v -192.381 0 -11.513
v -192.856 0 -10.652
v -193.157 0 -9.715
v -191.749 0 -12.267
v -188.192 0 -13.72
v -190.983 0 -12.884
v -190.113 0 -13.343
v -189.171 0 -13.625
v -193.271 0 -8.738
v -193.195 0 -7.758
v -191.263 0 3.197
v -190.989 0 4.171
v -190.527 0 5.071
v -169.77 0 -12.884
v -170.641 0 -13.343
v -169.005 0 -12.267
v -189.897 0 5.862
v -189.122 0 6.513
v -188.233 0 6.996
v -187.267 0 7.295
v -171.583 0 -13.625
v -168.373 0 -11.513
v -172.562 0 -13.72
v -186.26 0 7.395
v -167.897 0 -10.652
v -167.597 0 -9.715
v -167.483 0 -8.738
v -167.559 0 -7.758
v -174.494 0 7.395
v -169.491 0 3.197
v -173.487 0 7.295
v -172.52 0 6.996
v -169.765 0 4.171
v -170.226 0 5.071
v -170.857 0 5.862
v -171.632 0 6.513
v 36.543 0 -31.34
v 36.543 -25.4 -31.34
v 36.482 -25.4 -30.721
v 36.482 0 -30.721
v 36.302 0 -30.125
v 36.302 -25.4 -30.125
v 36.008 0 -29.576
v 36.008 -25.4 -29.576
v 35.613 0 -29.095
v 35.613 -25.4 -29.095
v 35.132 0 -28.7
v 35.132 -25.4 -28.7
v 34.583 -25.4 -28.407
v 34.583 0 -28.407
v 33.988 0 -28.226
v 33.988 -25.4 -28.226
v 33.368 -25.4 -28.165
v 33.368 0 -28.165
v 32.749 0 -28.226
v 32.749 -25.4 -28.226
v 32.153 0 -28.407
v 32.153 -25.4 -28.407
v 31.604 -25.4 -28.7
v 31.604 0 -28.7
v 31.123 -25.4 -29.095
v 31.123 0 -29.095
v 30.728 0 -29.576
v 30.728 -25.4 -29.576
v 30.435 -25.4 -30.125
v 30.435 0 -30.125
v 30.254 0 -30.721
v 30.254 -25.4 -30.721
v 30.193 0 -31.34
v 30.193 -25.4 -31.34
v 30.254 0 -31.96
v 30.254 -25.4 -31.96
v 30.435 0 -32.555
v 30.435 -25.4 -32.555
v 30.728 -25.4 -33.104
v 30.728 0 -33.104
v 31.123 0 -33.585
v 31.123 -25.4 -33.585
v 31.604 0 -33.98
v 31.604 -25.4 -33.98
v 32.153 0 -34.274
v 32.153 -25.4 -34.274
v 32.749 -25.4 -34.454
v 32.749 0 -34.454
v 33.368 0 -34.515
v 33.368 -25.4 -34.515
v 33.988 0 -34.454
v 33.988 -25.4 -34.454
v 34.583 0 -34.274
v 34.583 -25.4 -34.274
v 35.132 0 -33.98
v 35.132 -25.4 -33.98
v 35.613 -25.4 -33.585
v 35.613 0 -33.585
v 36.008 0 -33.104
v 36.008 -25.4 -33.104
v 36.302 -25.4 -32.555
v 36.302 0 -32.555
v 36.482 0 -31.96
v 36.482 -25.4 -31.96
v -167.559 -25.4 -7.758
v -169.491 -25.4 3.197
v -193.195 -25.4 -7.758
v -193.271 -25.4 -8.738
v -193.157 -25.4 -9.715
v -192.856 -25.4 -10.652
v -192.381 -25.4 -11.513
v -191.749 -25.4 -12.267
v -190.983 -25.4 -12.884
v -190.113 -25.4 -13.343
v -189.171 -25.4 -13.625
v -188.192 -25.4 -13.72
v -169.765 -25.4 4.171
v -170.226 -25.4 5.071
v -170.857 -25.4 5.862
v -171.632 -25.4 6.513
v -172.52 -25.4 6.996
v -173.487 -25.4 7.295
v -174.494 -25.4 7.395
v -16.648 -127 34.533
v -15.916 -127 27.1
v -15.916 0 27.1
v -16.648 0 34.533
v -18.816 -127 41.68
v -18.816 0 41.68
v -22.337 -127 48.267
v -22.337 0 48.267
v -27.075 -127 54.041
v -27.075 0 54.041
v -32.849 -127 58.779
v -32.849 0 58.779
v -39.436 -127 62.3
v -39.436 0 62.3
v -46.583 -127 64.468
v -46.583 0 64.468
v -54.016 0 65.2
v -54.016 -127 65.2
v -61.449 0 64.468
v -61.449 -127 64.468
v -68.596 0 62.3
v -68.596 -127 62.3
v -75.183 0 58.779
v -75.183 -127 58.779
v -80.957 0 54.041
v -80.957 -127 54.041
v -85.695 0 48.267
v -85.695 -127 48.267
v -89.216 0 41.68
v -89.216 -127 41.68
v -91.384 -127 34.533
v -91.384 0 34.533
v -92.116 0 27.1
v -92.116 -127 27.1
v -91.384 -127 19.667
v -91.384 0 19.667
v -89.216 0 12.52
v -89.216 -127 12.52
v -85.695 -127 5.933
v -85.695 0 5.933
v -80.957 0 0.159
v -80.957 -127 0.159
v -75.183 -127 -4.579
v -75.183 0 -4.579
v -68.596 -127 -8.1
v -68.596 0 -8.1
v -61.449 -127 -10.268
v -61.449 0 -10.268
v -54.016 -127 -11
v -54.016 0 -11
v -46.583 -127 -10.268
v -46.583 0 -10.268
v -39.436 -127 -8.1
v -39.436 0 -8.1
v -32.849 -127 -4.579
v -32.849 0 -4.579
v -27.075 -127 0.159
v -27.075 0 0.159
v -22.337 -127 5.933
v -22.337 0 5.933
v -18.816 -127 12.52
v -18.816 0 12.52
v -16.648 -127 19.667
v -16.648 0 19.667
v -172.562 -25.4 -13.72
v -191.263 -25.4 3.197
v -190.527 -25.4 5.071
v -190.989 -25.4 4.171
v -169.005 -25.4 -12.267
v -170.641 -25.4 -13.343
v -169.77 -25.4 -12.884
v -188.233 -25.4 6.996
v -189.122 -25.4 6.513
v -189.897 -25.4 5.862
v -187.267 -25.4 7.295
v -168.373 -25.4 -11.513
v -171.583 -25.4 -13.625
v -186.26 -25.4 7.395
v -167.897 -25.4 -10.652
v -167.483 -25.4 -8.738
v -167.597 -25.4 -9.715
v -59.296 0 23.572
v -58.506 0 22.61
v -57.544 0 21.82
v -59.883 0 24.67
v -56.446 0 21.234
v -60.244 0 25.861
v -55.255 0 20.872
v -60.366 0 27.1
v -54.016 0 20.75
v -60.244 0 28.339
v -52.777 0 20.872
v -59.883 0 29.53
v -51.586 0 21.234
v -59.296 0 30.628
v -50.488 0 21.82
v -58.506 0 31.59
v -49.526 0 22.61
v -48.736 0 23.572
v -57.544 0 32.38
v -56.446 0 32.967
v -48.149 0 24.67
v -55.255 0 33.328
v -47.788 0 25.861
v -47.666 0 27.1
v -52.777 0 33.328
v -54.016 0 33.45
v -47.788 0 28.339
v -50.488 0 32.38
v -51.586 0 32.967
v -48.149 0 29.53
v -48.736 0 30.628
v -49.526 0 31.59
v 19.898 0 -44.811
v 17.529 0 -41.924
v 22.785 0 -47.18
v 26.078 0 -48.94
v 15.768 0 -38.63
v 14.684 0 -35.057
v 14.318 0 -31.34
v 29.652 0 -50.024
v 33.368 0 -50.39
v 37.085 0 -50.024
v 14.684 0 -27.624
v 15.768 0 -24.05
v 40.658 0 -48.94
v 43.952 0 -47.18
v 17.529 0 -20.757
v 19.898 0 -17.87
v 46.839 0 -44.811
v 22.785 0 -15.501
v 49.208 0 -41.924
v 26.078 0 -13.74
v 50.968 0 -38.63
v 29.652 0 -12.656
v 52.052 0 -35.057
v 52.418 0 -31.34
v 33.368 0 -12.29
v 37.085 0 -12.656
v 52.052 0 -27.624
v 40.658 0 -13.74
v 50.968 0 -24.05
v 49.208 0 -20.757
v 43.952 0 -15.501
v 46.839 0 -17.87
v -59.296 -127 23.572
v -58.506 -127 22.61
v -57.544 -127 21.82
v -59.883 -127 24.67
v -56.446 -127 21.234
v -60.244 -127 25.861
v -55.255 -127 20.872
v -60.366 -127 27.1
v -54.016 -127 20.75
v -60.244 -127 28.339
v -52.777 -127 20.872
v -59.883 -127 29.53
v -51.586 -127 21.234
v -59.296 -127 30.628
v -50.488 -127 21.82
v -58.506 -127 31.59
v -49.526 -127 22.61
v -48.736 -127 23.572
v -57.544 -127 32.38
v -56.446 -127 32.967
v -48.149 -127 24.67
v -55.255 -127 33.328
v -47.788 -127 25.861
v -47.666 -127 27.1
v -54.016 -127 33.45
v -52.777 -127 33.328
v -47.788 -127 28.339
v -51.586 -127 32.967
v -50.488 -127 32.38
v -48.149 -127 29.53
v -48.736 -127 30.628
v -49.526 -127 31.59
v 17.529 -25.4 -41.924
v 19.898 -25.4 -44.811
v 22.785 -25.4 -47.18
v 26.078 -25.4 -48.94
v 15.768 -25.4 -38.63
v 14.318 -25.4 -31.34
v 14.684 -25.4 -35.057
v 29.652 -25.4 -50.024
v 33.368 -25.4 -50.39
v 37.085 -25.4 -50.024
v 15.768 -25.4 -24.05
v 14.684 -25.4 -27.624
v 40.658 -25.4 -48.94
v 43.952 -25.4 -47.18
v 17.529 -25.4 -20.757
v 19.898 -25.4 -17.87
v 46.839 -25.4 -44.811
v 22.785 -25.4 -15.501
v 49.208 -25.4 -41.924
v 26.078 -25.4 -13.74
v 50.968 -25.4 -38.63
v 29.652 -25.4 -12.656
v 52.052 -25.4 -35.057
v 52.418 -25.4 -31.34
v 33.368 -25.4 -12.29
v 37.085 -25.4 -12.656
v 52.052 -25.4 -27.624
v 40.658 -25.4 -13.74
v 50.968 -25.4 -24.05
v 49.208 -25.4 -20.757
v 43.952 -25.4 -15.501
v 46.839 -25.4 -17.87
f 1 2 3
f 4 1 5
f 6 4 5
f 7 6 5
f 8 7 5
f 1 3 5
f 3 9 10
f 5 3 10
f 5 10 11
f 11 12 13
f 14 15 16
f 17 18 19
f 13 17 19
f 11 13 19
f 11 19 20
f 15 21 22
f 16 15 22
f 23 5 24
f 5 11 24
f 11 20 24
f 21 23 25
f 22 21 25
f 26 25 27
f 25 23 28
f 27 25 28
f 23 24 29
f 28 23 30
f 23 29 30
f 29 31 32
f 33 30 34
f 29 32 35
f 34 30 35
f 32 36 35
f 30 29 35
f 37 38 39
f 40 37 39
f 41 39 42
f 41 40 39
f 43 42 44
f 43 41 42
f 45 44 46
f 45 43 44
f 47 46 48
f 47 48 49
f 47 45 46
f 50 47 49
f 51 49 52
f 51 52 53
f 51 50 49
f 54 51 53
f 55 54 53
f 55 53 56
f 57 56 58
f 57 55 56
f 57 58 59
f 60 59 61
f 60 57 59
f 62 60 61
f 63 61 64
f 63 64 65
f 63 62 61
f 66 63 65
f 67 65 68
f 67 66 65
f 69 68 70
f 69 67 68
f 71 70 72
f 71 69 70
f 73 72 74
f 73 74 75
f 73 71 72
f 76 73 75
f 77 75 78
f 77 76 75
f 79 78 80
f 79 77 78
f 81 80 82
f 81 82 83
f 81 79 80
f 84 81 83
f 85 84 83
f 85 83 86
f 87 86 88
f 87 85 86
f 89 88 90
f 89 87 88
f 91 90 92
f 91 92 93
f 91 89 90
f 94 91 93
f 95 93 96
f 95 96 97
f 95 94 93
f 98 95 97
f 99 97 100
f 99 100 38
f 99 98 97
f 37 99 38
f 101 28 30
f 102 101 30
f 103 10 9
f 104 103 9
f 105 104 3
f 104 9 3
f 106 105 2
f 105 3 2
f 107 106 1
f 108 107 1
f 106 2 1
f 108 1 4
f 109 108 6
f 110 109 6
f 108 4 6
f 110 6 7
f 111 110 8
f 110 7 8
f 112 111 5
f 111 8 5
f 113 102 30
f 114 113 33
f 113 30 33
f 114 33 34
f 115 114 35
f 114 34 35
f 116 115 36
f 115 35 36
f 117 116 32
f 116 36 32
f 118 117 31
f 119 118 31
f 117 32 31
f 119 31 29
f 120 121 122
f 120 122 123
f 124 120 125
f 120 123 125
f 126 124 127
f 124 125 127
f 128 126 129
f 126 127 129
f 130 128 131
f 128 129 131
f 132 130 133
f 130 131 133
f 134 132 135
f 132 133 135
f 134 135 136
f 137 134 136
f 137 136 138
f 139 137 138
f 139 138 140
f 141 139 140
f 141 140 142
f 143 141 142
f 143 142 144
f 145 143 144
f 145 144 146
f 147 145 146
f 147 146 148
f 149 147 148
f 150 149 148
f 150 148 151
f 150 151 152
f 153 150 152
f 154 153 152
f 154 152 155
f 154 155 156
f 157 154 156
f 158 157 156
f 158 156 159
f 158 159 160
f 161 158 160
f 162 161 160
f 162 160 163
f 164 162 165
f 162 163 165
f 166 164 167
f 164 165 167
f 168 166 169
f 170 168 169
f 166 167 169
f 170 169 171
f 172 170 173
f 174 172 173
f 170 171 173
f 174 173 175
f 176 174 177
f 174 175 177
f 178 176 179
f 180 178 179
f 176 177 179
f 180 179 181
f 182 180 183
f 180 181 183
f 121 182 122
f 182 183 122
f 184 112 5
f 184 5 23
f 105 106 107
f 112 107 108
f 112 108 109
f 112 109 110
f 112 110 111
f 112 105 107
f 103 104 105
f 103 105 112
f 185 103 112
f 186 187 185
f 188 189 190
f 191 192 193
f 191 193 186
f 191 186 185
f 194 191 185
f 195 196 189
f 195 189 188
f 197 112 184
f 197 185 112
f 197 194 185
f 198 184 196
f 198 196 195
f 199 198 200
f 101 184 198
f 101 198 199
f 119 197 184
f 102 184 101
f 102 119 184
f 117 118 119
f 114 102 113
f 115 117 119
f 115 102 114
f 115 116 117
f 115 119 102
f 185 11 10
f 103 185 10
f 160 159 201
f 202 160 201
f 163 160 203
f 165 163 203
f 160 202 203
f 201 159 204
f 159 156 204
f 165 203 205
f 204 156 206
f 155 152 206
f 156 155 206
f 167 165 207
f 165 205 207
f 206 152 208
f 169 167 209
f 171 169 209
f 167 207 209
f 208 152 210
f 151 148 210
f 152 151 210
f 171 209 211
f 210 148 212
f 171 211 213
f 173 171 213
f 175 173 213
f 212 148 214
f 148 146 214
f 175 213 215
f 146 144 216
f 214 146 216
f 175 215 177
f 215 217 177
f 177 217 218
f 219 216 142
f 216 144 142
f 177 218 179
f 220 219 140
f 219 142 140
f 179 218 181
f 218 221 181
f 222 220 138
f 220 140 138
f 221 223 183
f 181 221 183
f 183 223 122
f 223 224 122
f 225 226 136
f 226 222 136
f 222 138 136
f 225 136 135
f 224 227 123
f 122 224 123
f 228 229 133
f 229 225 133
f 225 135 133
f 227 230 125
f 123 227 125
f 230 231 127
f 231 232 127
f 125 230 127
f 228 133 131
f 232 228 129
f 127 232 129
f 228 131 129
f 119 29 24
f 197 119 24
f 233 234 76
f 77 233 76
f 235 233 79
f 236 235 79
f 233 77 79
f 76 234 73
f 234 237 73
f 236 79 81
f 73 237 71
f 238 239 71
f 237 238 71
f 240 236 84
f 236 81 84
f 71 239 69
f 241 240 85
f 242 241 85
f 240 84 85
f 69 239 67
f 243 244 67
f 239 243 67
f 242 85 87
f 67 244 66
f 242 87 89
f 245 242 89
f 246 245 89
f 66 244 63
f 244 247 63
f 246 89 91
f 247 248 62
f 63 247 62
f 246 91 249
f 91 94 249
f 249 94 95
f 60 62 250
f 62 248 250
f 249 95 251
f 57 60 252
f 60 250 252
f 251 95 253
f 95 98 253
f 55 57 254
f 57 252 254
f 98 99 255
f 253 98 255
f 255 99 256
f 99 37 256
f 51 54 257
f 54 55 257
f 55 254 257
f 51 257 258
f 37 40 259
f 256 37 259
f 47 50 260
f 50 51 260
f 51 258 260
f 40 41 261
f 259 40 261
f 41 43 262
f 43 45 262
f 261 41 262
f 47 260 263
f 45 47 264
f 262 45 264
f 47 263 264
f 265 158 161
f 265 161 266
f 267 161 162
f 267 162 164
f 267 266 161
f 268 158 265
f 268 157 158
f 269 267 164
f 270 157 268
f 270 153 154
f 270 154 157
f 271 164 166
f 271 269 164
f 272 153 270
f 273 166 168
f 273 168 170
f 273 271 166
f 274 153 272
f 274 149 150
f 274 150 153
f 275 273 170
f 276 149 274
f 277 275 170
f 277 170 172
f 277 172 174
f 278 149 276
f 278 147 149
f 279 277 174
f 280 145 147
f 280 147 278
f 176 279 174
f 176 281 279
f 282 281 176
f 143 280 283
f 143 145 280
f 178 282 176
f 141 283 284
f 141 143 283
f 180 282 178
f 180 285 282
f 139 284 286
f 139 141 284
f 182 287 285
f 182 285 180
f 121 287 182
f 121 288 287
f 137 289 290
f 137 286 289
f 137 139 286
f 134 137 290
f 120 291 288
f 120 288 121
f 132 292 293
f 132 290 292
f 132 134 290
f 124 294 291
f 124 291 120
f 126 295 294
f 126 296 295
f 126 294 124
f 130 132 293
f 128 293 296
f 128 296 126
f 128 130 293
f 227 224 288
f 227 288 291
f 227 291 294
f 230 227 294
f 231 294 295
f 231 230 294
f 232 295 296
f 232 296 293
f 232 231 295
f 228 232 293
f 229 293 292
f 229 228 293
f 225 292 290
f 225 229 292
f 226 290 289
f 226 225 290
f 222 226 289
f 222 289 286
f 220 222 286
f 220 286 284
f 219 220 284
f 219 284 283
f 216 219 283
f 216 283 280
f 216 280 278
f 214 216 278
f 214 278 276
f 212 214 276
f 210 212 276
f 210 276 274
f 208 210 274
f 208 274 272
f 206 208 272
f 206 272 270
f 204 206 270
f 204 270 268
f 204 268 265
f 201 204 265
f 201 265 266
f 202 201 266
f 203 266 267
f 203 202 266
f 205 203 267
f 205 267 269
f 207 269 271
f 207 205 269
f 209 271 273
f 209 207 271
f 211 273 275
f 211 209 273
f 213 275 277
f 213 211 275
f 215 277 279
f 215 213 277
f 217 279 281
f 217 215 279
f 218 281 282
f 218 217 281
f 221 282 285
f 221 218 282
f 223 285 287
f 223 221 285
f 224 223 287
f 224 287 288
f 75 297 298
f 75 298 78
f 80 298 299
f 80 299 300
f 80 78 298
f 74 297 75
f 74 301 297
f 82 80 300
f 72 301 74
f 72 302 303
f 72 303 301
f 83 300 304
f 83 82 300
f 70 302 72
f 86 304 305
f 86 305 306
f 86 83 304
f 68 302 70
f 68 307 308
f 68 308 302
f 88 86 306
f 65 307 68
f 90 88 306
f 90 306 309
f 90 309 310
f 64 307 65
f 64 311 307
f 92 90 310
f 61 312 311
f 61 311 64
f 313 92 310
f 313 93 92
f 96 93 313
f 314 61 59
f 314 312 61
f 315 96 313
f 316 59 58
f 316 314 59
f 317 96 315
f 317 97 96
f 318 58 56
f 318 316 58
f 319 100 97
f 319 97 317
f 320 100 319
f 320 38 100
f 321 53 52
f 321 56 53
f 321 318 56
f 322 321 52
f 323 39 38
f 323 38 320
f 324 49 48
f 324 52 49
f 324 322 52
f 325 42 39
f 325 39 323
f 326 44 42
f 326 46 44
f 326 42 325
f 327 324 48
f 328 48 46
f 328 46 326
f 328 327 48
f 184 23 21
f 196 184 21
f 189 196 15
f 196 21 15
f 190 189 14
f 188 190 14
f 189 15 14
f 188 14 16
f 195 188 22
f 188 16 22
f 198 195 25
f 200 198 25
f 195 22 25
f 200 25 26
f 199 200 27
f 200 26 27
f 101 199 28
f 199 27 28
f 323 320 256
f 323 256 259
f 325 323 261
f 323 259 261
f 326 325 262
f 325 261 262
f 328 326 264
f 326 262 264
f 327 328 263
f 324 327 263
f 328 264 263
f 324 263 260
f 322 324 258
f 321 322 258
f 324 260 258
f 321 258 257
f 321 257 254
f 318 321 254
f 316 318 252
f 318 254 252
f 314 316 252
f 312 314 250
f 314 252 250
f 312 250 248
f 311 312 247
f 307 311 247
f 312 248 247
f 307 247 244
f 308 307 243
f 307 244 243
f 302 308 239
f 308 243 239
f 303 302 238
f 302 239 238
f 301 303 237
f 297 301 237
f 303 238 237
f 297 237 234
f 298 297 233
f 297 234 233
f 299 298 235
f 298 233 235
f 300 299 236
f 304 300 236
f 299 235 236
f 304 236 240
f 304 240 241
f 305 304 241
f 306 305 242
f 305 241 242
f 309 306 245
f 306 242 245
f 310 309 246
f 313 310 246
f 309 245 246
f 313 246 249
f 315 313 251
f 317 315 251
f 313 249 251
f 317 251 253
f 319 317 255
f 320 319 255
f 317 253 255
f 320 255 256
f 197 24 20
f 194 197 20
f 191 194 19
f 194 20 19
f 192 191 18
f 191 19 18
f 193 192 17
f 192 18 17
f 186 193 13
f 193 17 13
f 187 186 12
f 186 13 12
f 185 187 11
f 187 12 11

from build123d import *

# Parameters (mm, degrees)
F0_R     = 38.1
F0_R_2   = 6.35
F1_DEPTH = 127
F2_DEPTH = 12.7
F3_R     = 19.05
F3_R_2   = 3.175
F4_DEPTH = 25.4


with BuildPart() as f1:
    # F0 (on Front) → F1 (new body)
    with BuildSketch(Plane.XZ):
        with Locations((-54.015968, 27.100163)):
            Circle(F0_R)
        with Locations((-54.015968, 27.100163)):
            Circle(F0_R_2, mode=Mode.SUBTRACT)
    extrude(amount=F1_DEPTH)

    # F0 (on Front) → F2 (join)
    with BuildSketch(Plane.XZ):
        with Locations((-54.015968, 27.100163)):
            Circle(F0_R)
        with Locations((-54.015968, 27.100163)):
            Circle(F0_R_2, mode=Mode.SUBTRACT)
    extrude(amount=F2_DEPTH)


with BuildPart() as f4:
    # F3 (on Front) → F4 (new body)
    with BuildSketch(Plane.XZ):
        with Locations((33.368226, -31.340323)):
            Circle(F3_R)
        with Locations((33.368226, -31.340323)):
            Circle(F3_R_2, mode=Mode.SUBTRACT)
        with BuildLine():
            Line((-174.493557, 7.395335), (-186.260086, 7.395335))
            ThreePointArc((-186.260086, 7.395335), (-189.525447, 6.206841), (-191.262909, 3.197468))
            Line((-191.262909, 3.197468), (-193.194602, -7.757707))
            ThreePointArc((-193.194602, -7.757707), (-192.083284, -11.905201), (-188.191779, -13.71984))
            Line((-188.191779, -13.71984), (-172.561864, -13.71984))
            ThreePointArc((-172.561864, -13.71984), (-168.670358, -11.905201), (-167.55904, -7.757707))
            Line((-167.55904, -7.757707), (-169.490733, 3.197468))
            ThreePointArc((-169.490733, 3.197468), (-171.228196, 6.206841), (-174.493557, 7.395335))
        make_face()
    extrude(amount=F4_DEPTH)


solid = Compound([f1.part, f4.part])
